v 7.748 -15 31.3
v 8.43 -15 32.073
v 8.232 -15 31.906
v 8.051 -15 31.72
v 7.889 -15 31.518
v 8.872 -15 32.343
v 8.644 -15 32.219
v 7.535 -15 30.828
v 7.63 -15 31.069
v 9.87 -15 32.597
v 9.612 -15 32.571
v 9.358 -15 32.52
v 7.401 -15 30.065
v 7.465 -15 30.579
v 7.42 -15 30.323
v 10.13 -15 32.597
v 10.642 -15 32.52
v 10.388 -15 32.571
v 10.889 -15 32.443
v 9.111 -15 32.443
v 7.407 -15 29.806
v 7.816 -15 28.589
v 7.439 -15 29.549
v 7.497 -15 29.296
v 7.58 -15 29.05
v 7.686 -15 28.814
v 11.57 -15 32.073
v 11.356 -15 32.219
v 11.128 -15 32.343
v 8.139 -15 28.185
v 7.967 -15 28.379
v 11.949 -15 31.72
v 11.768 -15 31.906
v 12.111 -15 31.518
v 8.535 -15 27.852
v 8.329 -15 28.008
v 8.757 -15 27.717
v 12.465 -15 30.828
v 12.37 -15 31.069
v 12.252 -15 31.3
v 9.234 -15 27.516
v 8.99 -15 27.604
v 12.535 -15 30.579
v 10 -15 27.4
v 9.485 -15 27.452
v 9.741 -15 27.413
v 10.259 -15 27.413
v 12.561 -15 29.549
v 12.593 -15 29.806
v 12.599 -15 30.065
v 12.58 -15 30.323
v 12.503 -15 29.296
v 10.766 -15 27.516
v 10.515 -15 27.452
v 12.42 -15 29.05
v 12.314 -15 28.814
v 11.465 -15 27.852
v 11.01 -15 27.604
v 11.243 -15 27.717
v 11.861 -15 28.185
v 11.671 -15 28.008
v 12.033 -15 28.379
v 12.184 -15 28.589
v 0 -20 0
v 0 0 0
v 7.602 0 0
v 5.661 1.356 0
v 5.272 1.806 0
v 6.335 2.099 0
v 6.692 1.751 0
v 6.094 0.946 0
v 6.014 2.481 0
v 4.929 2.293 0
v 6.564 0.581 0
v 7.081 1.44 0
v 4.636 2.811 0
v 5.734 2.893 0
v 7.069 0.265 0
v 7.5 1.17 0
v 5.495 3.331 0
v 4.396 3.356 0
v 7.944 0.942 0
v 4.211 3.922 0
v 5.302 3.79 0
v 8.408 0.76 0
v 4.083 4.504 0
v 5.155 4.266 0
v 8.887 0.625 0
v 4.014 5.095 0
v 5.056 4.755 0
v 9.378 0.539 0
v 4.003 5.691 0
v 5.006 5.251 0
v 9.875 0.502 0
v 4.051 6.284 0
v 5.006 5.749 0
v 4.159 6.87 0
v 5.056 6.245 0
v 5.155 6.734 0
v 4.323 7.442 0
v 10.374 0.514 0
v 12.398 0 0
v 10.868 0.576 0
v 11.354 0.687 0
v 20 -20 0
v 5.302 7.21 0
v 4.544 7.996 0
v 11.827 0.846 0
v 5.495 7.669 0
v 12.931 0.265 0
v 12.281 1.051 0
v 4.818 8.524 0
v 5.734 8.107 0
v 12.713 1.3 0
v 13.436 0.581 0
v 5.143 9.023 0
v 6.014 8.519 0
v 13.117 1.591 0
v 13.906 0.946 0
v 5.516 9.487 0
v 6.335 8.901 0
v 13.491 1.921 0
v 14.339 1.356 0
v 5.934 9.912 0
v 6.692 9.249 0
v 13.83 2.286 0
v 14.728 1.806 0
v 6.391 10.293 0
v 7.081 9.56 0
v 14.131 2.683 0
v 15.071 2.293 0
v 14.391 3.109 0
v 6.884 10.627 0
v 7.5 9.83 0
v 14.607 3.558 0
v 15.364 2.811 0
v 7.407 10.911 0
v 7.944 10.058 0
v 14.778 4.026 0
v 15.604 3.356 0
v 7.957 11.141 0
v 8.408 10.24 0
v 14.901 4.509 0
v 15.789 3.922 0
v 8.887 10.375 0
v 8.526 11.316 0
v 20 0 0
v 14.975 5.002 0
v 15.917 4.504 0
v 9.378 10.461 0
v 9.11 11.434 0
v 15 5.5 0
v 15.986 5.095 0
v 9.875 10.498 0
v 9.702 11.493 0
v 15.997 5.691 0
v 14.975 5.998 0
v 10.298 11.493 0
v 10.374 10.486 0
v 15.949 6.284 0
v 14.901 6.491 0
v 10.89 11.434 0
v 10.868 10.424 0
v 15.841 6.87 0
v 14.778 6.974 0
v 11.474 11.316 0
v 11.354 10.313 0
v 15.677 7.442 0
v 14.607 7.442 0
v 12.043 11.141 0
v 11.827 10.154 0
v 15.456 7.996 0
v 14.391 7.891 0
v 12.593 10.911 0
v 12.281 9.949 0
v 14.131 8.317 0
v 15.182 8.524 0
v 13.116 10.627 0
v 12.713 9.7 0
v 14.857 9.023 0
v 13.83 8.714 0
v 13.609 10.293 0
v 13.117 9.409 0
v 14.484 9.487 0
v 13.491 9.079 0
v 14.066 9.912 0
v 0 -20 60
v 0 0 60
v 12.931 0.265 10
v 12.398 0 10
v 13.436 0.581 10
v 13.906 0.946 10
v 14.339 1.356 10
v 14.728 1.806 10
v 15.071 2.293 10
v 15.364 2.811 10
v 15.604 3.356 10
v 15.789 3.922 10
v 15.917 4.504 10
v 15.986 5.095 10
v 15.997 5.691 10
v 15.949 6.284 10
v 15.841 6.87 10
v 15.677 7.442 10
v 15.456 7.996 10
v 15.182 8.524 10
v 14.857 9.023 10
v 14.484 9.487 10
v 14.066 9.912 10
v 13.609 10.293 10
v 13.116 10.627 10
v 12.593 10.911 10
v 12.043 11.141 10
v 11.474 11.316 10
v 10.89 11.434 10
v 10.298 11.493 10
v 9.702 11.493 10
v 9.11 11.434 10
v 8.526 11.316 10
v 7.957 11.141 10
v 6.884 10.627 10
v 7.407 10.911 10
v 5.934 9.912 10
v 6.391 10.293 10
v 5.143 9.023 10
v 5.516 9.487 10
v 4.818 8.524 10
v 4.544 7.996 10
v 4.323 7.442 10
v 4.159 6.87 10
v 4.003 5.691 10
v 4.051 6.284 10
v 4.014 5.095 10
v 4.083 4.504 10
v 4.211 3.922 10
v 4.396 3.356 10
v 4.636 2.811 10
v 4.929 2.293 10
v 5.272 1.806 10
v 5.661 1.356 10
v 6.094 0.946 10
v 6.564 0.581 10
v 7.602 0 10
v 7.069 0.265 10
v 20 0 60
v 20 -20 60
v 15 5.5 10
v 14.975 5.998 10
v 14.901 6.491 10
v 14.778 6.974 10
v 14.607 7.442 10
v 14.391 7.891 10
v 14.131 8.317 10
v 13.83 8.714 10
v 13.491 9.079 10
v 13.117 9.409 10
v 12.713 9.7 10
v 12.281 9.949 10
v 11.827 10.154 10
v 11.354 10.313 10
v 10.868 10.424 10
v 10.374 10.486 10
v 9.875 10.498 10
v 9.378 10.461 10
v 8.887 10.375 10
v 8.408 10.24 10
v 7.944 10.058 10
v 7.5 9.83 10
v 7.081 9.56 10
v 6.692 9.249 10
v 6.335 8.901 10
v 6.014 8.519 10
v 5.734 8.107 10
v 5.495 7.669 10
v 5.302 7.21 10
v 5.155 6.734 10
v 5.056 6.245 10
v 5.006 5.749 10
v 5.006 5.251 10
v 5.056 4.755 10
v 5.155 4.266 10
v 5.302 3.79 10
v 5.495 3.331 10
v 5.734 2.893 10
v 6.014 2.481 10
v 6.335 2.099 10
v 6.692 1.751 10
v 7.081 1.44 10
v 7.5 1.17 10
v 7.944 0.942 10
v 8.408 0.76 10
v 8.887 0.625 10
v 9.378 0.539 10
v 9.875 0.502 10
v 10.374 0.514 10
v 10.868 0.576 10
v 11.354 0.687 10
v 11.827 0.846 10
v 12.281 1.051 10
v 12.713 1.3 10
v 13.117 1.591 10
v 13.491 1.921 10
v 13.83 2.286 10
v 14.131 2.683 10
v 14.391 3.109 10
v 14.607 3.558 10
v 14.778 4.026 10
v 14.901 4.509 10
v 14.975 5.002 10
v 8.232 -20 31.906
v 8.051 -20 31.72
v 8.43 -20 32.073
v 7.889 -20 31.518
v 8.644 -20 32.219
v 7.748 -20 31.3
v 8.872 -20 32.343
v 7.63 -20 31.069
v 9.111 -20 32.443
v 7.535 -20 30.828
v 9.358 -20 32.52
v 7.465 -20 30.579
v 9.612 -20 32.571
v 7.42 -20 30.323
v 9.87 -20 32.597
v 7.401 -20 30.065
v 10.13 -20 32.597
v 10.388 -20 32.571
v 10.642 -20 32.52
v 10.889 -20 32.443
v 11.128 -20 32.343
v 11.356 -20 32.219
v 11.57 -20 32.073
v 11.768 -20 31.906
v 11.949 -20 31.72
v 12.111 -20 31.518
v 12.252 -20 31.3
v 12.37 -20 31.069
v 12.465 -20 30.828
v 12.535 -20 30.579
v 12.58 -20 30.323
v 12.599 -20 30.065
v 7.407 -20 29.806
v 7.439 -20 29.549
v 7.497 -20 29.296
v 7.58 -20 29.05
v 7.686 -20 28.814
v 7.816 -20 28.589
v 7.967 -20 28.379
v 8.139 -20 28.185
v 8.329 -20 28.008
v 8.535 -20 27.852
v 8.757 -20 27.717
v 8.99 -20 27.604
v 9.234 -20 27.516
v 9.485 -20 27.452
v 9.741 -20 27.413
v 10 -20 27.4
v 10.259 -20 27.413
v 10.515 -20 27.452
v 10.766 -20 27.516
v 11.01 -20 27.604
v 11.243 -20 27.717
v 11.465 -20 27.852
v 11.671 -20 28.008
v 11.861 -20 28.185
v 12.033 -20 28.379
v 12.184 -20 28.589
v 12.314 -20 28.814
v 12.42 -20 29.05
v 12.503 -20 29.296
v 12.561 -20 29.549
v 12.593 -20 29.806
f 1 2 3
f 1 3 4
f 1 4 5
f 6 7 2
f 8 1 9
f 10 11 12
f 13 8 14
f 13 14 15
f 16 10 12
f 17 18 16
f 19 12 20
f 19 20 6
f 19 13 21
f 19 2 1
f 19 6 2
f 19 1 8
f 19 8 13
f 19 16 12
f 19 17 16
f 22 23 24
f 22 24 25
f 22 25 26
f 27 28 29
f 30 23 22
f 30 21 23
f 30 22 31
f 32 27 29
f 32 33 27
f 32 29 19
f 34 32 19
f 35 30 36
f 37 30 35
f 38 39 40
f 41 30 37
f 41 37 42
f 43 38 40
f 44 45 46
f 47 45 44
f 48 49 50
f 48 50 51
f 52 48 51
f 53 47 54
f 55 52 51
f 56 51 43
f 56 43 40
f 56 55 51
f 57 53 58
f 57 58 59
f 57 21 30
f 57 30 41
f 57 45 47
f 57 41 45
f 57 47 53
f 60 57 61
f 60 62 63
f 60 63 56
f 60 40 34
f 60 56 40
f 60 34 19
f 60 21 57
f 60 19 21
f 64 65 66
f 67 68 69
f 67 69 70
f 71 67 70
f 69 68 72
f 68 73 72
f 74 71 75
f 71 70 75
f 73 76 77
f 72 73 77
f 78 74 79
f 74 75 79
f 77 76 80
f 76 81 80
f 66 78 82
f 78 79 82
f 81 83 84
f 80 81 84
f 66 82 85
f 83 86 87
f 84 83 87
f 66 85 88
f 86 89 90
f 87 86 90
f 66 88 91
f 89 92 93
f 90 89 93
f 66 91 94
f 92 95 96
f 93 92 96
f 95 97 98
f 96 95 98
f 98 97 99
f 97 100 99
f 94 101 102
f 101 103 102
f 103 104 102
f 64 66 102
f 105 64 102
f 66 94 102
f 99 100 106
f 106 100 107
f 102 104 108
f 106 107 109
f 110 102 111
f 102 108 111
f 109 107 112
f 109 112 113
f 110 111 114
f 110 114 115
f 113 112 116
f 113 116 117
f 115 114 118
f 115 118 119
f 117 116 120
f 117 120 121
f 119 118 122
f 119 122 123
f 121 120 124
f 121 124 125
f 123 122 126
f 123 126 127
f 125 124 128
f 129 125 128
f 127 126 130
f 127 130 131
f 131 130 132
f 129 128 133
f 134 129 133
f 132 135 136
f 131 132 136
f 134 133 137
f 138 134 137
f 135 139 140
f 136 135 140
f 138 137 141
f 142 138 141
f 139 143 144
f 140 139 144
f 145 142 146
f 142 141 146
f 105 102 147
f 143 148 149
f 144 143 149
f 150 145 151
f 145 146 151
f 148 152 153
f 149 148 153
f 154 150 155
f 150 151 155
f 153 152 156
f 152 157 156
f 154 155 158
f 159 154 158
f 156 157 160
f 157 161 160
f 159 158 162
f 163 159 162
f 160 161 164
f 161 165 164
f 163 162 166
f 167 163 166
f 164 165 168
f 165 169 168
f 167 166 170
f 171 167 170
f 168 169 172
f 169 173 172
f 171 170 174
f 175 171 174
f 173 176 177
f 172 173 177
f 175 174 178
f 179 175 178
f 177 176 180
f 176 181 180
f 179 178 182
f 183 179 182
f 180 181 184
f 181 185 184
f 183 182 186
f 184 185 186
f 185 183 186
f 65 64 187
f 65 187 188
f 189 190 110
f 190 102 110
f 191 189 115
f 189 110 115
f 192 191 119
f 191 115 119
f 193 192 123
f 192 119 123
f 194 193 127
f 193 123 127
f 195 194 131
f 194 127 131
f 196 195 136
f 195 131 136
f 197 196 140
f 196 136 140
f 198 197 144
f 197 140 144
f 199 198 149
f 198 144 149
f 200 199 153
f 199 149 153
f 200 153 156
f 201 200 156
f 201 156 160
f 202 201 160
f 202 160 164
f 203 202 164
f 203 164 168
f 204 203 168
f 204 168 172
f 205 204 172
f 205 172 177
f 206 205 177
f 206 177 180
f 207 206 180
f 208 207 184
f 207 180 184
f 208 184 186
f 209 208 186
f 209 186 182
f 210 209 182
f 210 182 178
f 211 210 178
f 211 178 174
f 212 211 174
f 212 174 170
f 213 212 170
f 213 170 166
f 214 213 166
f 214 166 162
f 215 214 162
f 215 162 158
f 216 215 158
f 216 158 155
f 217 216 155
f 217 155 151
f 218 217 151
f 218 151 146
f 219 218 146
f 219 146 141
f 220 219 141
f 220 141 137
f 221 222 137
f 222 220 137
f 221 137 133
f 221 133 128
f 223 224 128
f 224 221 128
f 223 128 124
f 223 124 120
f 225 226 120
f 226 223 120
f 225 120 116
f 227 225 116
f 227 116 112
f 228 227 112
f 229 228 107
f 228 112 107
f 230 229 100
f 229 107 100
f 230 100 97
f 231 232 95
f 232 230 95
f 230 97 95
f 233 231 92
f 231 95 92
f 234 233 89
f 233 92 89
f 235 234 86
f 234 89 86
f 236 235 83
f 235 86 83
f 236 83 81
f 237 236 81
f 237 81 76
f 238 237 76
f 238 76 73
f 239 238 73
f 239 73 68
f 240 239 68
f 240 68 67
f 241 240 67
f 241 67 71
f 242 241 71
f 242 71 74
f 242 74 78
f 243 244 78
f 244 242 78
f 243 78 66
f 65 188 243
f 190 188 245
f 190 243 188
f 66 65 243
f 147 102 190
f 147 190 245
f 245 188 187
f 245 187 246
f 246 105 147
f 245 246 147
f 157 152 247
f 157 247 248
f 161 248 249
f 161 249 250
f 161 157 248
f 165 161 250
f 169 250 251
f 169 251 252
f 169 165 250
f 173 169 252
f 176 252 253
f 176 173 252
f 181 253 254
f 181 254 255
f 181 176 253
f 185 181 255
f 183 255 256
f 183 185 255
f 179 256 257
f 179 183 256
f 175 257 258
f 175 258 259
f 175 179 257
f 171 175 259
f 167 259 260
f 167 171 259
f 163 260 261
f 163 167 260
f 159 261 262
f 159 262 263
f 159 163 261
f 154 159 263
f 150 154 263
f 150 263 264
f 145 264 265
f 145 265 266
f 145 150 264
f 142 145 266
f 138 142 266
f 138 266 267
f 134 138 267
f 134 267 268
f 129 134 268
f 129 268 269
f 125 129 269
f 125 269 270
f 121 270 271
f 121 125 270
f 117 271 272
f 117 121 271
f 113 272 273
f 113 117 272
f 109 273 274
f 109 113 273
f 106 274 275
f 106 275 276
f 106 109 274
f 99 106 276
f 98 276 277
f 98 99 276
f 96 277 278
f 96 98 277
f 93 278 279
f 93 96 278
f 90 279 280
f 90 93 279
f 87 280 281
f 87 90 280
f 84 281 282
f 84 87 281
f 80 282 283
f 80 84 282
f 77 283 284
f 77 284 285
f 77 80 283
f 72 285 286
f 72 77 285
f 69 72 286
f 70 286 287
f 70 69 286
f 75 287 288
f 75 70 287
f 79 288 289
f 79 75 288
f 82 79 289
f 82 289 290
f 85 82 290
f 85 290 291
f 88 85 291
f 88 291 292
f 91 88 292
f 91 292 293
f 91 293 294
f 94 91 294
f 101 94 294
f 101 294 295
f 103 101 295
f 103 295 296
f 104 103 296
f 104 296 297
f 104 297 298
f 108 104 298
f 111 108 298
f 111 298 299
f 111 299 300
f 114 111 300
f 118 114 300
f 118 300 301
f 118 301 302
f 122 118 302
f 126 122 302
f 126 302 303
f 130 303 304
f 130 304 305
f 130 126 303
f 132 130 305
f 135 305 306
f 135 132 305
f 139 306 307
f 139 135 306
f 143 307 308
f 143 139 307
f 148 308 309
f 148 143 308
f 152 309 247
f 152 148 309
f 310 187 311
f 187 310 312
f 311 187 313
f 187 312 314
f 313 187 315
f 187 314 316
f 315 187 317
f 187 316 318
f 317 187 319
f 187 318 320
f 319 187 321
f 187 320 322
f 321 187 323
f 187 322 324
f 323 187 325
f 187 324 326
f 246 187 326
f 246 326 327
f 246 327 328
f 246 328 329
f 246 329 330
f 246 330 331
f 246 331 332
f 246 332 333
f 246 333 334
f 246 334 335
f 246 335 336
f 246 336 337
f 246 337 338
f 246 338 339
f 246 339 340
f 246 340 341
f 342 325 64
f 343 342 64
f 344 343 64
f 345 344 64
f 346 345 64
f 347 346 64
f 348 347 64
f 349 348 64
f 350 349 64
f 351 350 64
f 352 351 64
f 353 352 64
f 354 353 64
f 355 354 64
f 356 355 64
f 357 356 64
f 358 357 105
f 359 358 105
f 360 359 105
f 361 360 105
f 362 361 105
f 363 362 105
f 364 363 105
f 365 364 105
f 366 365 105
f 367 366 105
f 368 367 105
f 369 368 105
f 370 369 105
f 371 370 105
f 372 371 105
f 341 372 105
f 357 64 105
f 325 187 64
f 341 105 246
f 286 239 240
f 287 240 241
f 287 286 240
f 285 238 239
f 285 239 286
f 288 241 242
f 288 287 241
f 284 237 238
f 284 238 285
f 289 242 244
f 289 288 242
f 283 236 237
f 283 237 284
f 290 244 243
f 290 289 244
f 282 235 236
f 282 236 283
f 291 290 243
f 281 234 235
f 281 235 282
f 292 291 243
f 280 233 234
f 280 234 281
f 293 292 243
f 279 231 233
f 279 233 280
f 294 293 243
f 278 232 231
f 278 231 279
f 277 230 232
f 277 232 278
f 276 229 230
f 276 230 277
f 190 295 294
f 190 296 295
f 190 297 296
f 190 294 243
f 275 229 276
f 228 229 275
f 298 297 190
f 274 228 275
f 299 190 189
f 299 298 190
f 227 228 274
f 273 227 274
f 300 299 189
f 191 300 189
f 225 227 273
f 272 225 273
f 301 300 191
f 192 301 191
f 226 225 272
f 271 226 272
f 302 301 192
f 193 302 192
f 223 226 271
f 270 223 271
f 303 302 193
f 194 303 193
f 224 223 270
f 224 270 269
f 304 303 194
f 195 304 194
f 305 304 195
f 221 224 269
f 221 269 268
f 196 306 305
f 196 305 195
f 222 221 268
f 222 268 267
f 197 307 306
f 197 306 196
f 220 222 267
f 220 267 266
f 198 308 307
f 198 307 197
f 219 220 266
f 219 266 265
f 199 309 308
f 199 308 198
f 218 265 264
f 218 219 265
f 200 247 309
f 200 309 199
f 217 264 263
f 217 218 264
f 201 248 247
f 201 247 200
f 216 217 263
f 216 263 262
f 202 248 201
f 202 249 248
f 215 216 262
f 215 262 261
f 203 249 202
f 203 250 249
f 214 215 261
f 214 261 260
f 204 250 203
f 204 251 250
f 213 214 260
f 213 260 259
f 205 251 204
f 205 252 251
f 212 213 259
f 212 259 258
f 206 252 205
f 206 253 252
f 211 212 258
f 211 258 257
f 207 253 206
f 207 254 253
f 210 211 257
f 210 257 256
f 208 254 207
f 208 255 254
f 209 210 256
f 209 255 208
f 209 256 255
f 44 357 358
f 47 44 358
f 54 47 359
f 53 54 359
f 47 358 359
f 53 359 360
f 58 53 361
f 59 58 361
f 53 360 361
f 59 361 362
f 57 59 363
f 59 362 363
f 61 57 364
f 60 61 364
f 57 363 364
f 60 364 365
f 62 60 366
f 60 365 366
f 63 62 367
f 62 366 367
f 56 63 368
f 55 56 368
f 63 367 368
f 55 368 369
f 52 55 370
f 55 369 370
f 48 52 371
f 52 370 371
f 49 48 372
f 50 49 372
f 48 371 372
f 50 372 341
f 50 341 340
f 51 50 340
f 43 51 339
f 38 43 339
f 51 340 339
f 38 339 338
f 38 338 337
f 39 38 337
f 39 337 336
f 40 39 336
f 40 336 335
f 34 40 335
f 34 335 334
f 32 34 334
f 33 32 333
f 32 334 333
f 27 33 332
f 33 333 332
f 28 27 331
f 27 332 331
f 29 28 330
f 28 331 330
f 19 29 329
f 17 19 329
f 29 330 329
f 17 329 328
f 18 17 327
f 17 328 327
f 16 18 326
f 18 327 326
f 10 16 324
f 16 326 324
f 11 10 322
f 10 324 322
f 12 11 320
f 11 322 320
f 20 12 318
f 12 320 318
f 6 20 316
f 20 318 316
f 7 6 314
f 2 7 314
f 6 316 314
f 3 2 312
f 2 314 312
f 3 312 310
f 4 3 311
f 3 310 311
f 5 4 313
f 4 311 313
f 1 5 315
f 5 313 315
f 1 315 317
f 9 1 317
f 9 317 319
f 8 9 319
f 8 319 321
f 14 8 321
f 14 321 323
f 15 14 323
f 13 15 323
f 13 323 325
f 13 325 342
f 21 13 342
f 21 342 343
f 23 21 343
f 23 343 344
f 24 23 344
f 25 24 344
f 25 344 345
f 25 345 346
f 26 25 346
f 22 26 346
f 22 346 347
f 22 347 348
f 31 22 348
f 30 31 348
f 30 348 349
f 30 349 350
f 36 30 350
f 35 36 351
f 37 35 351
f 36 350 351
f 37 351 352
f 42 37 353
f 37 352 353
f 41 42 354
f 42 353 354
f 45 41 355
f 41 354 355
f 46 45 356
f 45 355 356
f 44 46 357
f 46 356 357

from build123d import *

# Parameters (mm, degrees)
SKETCH1_W           = 20
SKETCH1_H           = 20
BOSS_EXTRUDE1_DEPTH = 60
SKETCH2_R           = 2.6
CUT_EXTRUDE1_DEPTH  = 5
SKETCH3_R           = 6
SKETCH3_R_2         = 5
BOSS_EXTRUDE2_DEPTH = 10


with BuildPart() as part:
    # Sketch1 → Boss-Extrude1 (new body)
    with BuildSketch(Plane.XY):
        with Locations((10, -10)):
            Rectangle(SKETCH1_W, SKETCH1_H)
    extrude(amount=BOSS_EXTRUDE1_DEPTH)

    # Sketch2 → Cut-Extrude1 (cut)
    with BuildSketch(Plane.XZ.offset(20)):
        with Locations(Location((10, 30, 0), (0, 0, 270))):
            Circle(SKETCH2_R)
    extrude(amount=-CUT_EXTRUDE1_DEPTH, mode=Mode.SUBTRACT)

    # Sketch3 → Boss-Extrude2 (add)
    with BuildSketch(Plane.XY):
        with Locations((10, 5.5)):
            Circle(SKETCH3_R)
        with Locations((10, 5.5)):
            Circle(SKETCH3_R_2, mode=Mode.SUBTRACT)
    extrude(amount=BOSS_EXTRUDE2_DEPTH)


solid = part.part
